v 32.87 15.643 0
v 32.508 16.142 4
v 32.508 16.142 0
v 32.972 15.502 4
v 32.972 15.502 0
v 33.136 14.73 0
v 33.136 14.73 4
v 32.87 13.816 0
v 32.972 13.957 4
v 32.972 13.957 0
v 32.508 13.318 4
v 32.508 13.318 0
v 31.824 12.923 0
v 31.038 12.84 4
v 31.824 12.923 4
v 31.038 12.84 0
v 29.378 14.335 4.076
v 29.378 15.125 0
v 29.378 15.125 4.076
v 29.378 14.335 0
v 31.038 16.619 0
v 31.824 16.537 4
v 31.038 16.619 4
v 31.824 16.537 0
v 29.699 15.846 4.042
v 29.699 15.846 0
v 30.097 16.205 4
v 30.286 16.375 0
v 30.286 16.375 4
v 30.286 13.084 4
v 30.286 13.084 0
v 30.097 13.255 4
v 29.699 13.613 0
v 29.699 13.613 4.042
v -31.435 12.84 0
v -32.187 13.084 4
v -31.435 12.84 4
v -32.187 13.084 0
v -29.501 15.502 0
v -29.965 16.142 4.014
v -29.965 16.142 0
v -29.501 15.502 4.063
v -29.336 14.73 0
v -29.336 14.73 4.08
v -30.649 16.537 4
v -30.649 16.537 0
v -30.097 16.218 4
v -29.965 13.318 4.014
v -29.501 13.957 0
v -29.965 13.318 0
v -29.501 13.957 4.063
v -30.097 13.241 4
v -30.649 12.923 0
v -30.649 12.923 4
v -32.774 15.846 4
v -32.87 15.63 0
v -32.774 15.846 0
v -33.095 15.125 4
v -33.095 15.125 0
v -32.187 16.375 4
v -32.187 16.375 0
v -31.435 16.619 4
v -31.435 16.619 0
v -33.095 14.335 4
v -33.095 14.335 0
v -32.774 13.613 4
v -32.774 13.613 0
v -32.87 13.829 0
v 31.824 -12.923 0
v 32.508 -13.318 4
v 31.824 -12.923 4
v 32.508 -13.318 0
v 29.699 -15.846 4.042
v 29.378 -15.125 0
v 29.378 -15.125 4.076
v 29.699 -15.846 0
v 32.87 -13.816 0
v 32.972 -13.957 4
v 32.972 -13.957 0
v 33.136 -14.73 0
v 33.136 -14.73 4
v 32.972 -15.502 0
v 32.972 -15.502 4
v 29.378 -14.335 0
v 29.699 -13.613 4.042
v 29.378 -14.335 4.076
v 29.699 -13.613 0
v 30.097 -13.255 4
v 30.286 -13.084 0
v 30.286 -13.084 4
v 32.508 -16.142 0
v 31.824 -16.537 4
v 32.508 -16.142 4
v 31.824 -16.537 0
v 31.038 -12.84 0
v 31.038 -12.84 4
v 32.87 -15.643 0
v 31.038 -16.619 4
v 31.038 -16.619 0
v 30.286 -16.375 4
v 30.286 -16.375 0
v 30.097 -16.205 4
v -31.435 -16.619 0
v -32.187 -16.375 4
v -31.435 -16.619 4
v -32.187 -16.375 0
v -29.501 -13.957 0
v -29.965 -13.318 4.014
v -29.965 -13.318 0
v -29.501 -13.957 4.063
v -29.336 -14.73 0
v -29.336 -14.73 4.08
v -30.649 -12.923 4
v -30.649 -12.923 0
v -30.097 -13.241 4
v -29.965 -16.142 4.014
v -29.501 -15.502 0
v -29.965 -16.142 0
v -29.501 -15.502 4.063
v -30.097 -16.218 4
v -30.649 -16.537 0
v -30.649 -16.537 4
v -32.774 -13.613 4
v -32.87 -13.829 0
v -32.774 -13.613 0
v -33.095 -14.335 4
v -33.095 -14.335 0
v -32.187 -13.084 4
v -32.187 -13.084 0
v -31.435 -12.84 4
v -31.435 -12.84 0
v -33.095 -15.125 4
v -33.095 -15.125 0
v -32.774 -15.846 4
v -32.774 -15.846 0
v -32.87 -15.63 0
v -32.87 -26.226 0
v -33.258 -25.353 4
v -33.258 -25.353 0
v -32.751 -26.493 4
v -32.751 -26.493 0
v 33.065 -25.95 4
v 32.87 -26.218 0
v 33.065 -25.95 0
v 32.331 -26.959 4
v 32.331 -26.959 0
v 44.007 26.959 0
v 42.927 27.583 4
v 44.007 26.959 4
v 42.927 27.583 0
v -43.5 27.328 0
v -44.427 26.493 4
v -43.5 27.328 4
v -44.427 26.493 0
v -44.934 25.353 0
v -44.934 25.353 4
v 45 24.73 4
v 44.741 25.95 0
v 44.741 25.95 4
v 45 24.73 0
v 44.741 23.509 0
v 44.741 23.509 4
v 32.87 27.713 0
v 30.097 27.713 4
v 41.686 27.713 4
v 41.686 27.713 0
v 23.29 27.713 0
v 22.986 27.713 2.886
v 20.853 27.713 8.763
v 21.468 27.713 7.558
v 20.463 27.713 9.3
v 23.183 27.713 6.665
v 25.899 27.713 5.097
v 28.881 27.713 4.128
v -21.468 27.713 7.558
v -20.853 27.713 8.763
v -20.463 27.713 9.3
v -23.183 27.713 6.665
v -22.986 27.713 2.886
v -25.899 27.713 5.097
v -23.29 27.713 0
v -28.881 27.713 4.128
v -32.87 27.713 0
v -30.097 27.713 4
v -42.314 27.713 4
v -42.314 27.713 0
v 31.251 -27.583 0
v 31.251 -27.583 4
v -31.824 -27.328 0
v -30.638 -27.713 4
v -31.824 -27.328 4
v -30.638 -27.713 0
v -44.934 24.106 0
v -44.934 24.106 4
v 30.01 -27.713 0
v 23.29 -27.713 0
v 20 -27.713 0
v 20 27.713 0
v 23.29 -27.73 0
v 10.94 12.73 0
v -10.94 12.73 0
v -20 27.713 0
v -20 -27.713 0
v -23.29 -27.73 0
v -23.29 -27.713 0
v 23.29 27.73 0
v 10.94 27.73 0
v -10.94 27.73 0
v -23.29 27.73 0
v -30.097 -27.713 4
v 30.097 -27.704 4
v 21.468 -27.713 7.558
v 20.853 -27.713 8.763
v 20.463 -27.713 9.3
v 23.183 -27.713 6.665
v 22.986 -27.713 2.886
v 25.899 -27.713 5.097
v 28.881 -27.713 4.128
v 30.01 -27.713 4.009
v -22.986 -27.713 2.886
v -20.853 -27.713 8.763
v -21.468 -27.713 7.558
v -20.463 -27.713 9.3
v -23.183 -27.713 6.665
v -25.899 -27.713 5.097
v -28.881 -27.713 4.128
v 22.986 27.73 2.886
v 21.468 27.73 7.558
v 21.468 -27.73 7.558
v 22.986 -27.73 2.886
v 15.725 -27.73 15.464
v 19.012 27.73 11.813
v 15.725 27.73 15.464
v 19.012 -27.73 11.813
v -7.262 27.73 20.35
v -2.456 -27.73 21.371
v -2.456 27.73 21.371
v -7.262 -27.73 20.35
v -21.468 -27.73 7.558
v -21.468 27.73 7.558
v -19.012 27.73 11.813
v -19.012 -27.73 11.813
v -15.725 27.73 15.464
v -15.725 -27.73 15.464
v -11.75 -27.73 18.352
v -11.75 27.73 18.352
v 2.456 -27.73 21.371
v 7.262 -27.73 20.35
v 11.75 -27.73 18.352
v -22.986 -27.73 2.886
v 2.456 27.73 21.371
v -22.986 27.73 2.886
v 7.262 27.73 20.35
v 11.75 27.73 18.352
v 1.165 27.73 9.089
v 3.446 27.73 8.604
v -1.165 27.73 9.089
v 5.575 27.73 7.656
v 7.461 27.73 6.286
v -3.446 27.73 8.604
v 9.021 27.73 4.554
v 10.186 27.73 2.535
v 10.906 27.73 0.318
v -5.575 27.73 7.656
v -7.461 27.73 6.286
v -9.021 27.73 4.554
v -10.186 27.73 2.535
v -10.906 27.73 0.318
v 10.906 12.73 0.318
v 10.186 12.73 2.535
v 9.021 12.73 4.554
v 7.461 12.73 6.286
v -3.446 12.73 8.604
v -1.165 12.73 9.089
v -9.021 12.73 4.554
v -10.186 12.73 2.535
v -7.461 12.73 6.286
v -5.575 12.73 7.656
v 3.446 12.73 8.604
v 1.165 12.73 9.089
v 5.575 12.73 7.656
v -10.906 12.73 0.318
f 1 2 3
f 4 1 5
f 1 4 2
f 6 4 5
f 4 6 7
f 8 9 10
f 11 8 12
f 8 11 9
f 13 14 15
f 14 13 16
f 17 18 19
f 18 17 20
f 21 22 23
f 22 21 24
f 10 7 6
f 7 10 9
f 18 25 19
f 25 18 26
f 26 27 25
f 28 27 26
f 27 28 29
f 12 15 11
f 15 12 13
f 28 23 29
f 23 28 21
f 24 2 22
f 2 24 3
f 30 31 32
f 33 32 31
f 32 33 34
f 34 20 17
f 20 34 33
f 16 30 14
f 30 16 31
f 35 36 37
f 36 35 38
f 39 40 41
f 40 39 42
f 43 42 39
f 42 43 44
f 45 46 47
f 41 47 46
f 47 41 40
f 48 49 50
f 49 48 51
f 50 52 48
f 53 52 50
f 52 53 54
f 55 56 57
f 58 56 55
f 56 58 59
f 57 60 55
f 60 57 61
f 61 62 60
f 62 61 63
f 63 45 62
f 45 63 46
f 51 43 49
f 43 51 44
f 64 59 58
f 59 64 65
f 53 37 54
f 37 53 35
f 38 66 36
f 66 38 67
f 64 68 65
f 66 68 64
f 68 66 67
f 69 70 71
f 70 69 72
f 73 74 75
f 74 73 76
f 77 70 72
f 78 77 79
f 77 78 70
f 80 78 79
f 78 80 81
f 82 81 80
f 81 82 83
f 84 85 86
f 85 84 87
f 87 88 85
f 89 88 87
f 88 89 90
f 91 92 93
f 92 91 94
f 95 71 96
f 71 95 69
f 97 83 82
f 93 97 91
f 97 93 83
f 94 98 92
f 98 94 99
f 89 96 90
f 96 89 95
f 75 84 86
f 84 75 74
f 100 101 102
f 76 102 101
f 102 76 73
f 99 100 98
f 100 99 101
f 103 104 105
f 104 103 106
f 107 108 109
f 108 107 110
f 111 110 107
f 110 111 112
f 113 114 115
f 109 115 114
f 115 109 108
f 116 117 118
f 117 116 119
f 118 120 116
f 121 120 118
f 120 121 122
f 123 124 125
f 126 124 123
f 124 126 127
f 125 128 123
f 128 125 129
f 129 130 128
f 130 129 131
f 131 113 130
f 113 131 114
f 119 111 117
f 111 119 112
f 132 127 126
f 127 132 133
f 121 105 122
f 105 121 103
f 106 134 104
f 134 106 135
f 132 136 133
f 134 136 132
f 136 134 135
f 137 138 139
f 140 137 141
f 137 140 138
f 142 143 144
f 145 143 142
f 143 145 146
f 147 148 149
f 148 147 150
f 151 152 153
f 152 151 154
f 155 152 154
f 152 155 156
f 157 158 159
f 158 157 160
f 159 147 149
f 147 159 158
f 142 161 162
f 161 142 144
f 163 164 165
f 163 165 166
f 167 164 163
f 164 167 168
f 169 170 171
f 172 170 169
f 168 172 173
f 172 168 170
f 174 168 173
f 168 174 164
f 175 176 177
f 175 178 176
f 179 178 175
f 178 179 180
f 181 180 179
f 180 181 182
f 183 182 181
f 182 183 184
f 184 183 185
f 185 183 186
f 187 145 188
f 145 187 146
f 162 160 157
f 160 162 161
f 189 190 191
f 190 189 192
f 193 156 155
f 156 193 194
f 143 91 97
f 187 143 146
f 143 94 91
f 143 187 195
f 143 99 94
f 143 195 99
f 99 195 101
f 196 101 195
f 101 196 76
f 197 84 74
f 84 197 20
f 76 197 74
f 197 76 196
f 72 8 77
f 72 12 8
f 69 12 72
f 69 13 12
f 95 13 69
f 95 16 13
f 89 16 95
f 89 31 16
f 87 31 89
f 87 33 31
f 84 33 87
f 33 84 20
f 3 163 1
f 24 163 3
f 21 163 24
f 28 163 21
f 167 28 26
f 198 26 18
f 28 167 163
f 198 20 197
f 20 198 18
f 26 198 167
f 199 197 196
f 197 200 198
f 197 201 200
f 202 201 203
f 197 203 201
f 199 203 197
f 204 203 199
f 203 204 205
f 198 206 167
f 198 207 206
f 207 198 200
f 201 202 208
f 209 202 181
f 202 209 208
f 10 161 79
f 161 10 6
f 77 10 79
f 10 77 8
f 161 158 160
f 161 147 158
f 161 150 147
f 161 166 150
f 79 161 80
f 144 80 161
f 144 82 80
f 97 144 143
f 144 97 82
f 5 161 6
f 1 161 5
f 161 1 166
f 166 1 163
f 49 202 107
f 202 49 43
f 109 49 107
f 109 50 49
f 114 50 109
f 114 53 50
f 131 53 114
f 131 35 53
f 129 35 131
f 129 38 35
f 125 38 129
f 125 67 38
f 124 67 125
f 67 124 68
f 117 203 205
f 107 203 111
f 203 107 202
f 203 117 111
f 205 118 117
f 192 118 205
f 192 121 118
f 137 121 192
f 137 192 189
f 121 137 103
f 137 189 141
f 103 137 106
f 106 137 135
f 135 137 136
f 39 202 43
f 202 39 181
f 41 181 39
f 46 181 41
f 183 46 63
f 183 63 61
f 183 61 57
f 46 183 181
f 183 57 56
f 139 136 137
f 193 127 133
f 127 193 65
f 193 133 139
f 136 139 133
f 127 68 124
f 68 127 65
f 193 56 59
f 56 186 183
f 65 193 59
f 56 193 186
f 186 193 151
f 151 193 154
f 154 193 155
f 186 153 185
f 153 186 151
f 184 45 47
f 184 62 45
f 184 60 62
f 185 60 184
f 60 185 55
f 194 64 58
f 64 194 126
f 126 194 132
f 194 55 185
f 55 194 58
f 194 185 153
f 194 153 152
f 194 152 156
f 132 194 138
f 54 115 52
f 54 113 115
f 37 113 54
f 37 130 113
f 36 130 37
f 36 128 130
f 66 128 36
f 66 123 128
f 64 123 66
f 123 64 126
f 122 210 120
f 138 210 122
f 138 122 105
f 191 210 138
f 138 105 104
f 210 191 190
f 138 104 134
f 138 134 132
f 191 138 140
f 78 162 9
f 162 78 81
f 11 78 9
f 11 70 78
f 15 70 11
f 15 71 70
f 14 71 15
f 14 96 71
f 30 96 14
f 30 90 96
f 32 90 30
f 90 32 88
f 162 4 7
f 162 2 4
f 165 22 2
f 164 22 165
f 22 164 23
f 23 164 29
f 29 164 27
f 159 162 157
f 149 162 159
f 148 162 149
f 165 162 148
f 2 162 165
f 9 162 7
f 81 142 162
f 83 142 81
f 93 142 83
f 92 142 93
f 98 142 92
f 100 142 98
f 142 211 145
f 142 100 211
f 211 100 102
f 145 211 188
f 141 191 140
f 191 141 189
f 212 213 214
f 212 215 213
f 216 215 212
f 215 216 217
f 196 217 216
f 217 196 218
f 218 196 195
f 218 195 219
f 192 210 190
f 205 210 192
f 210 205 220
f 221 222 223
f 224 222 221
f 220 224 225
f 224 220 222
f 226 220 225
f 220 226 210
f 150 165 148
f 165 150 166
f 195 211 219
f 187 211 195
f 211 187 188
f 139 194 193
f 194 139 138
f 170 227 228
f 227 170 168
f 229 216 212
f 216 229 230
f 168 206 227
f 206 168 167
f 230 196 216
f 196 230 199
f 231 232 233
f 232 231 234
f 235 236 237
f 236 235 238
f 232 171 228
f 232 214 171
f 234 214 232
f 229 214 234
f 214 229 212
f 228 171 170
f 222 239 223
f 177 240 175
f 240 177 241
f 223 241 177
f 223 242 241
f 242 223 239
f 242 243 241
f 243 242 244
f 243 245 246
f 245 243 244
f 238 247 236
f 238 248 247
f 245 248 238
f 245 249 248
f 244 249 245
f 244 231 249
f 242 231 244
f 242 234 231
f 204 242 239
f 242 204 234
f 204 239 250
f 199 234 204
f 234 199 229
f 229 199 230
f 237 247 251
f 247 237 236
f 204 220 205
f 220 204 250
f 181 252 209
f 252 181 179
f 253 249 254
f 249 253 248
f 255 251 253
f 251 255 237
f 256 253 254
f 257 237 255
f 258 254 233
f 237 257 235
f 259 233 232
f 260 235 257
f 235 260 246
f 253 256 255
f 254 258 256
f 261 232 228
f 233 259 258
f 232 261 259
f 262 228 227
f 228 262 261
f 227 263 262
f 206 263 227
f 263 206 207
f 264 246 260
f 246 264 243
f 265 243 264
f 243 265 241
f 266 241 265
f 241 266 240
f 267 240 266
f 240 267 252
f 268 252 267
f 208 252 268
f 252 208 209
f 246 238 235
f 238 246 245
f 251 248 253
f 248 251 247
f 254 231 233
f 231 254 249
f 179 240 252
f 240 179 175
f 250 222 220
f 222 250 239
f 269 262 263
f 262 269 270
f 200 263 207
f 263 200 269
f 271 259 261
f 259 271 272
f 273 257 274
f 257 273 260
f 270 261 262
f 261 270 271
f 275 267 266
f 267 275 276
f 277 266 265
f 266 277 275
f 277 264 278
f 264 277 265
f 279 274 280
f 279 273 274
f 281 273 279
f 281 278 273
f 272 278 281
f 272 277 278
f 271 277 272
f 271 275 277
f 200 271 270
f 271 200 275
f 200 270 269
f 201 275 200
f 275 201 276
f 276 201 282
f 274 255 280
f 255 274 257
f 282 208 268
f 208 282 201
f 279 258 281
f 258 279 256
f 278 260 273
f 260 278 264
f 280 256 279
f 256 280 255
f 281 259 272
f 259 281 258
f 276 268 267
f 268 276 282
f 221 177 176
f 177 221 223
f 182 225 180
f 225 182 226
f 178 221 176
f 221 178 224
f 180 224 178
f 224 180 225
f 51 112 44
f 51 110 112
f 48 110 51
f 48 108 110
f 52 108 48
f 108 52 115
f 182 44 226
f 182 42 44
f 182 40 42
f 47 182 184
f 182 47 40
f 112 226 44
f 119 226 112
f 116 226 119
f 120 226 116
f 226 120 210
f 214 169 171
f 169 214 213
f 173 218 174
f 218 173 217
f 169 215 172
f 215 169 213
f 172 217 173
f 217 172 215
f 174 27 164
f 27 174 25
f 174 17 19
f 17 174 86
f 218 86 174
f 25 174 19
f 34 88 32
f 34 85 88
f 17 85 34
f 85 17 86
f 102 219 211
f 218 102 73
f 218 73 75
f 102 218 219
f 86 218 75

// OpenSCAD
open_beam = 15; //open beam dimensions (square)
perspex_width = 5;
bearing_od = 22;
bearing_id = 8;
hole_space = 65.673;//hole spacing on perspex round plate
hole_to_front_edge = 13;
r_corners = 3;
plate_thickness = 4;
extrusion=0.3;

//variables for thingiverse obtained cylinder rounding tool
pad = 0.1;	// Padding to maintain manifold
ch = 15;
cr = 25;
ct = 1;
r = 10;
smooth = 180;	// Number of facets of rounding cylinder

//variables for edge fillet
b = 13;
h = 20;
w = 90*0.5888888+r_corners;

//===========================================================================================
//===========================================================================================

module plate_fixture(length, thickness){
	difference(){
		hull(){
			translate([length/2, (length*0.5888)/2, 0])cylinder(r=r_corners, h=thickness, $fn=15);
			translate([-length/2, (length*0.5888)/2, 0])cylinder(r=r_corners, h=thickness, $fn=15);
			translate([-(length*0.722)/2, -(length*0.5888)/2, 0])cylinder(r=r_corners, h=thickness, $fn=15);
			translate([(length*0.722)/2, -(length*0.5888)/2, 0])cylinder(r=r_corners, h=thickness, $fn=15);

		}
		union(){
			translate([(hole_space)/2-1.6, (length*0.5888)/2-13+r_corners, -1])cylinder(r=1.6+extrusion, h=thickness+2, $fn=15);
			translate([(-hole_space)/2+1.6, (length*0.5888)/2-13+r_corners, -1])cylinder(r=1.6+extrusion, h=thickness+2, $fn=15);
			translate([(hole_space)/2-1.6, -(length*0.5888)/2+13-r_corners, -1])cylinder(r=1.6+extrusion, h=thickness+2, $fn=15);
			translate([(-hole_space)/2+1.6, -(length*0.5888)/2+13-r_corners, -1])cylinder(r=1.6+extrusion, h=thickness+2, $fn=15);
		}
	}
}
//===========================================================================================
//===========================================================================================
module bearing_slot(od, id, width, length){
	rotate([90,0,0])
	translate([0, -plate_thickness/2, -(length*0.5888)/2-r_corners])
	//difference(){
		cylinder(d=od+extrusion, h=width*2+1);
		//cylinder(d=id, h=width);
	//}
}
//===========================================================================================
//===========================================================================================
module reinforcement(length){
	rotate([90,0,0])
	translate([0, -plate_thickness/2, -(length*0.5888)/2-r_corners])
	cylinder(r=23.5, h=(length*0.5888)+2*r_corners);
	}
	//===========================================================================================
//===========================================================================================
module top_half(){
translate([0, 0, -100])
cube(size=[200, 200, 200], center=true);

}
//===========================================================================================
//===========================================================================================
module bot_half(){
translate([0, 0, 100])
cube(size=[200, 200, 200], center=true);

}
//===========================================================================================
//===========================================================================================
module cylinder_fillet(){
// Inside Fillet
translate([0, -90*0.65/2, 0])
rotate([-90, 0, 0])
difference() {
	rotate_extrude(convexity=10,  $fn = smooth)
		translate([cr-ct-r+pad,ct-pad,0])
			square(r+pad,r+pad);
	rotate_extrude(convexity=10,  $fn = smooth)
		translate([cr-ct-r,ct+r,0])
			circle(r=r,$fn=smooth);
}


}
//===========================================================================================
//===========================================================================================
module edge_fillet(){
	//Start with an extruded triangle

	rotate(a=[90,-90,0])
		difference(){
			linear_extrude(height = w, center = true, convexity = 10, twist = 0)
				polygon(points=[[0,0],[h,0],[0,b]], paths=[[0,1,2]]);
			translate([h-1, b-1, -w/2])cylinder(r=15, h=w, $fn=30);
		}

}
//===========================================================================================
//===========================================================================================
	
difference(){	
difference(){
	union(){
		translate([0, 0, -5-plate_thickness])plate_fixture(90-2*r_corners);
		plate_fixture(90-2*r_corners, plate_thickness);
		//difference(){
			reinforcement(90-2*r_corners);
			//cylinder_fillet();
		//}
	}
	bearing_slot(bearing_od, bearing_id, 7, 90-2*r_corners);

}
top_half();
}

intersection(){
plate_fixture(90-2*r_corners, 20);
translate([-20, 0, -0.2])
edge_fillet();
}
intersection(){
plate_fixture(90-2*r_corners, 20);
rotate([0, 0, 180])
translate([-20, 0, -0.2])
edge_fillet();
}
